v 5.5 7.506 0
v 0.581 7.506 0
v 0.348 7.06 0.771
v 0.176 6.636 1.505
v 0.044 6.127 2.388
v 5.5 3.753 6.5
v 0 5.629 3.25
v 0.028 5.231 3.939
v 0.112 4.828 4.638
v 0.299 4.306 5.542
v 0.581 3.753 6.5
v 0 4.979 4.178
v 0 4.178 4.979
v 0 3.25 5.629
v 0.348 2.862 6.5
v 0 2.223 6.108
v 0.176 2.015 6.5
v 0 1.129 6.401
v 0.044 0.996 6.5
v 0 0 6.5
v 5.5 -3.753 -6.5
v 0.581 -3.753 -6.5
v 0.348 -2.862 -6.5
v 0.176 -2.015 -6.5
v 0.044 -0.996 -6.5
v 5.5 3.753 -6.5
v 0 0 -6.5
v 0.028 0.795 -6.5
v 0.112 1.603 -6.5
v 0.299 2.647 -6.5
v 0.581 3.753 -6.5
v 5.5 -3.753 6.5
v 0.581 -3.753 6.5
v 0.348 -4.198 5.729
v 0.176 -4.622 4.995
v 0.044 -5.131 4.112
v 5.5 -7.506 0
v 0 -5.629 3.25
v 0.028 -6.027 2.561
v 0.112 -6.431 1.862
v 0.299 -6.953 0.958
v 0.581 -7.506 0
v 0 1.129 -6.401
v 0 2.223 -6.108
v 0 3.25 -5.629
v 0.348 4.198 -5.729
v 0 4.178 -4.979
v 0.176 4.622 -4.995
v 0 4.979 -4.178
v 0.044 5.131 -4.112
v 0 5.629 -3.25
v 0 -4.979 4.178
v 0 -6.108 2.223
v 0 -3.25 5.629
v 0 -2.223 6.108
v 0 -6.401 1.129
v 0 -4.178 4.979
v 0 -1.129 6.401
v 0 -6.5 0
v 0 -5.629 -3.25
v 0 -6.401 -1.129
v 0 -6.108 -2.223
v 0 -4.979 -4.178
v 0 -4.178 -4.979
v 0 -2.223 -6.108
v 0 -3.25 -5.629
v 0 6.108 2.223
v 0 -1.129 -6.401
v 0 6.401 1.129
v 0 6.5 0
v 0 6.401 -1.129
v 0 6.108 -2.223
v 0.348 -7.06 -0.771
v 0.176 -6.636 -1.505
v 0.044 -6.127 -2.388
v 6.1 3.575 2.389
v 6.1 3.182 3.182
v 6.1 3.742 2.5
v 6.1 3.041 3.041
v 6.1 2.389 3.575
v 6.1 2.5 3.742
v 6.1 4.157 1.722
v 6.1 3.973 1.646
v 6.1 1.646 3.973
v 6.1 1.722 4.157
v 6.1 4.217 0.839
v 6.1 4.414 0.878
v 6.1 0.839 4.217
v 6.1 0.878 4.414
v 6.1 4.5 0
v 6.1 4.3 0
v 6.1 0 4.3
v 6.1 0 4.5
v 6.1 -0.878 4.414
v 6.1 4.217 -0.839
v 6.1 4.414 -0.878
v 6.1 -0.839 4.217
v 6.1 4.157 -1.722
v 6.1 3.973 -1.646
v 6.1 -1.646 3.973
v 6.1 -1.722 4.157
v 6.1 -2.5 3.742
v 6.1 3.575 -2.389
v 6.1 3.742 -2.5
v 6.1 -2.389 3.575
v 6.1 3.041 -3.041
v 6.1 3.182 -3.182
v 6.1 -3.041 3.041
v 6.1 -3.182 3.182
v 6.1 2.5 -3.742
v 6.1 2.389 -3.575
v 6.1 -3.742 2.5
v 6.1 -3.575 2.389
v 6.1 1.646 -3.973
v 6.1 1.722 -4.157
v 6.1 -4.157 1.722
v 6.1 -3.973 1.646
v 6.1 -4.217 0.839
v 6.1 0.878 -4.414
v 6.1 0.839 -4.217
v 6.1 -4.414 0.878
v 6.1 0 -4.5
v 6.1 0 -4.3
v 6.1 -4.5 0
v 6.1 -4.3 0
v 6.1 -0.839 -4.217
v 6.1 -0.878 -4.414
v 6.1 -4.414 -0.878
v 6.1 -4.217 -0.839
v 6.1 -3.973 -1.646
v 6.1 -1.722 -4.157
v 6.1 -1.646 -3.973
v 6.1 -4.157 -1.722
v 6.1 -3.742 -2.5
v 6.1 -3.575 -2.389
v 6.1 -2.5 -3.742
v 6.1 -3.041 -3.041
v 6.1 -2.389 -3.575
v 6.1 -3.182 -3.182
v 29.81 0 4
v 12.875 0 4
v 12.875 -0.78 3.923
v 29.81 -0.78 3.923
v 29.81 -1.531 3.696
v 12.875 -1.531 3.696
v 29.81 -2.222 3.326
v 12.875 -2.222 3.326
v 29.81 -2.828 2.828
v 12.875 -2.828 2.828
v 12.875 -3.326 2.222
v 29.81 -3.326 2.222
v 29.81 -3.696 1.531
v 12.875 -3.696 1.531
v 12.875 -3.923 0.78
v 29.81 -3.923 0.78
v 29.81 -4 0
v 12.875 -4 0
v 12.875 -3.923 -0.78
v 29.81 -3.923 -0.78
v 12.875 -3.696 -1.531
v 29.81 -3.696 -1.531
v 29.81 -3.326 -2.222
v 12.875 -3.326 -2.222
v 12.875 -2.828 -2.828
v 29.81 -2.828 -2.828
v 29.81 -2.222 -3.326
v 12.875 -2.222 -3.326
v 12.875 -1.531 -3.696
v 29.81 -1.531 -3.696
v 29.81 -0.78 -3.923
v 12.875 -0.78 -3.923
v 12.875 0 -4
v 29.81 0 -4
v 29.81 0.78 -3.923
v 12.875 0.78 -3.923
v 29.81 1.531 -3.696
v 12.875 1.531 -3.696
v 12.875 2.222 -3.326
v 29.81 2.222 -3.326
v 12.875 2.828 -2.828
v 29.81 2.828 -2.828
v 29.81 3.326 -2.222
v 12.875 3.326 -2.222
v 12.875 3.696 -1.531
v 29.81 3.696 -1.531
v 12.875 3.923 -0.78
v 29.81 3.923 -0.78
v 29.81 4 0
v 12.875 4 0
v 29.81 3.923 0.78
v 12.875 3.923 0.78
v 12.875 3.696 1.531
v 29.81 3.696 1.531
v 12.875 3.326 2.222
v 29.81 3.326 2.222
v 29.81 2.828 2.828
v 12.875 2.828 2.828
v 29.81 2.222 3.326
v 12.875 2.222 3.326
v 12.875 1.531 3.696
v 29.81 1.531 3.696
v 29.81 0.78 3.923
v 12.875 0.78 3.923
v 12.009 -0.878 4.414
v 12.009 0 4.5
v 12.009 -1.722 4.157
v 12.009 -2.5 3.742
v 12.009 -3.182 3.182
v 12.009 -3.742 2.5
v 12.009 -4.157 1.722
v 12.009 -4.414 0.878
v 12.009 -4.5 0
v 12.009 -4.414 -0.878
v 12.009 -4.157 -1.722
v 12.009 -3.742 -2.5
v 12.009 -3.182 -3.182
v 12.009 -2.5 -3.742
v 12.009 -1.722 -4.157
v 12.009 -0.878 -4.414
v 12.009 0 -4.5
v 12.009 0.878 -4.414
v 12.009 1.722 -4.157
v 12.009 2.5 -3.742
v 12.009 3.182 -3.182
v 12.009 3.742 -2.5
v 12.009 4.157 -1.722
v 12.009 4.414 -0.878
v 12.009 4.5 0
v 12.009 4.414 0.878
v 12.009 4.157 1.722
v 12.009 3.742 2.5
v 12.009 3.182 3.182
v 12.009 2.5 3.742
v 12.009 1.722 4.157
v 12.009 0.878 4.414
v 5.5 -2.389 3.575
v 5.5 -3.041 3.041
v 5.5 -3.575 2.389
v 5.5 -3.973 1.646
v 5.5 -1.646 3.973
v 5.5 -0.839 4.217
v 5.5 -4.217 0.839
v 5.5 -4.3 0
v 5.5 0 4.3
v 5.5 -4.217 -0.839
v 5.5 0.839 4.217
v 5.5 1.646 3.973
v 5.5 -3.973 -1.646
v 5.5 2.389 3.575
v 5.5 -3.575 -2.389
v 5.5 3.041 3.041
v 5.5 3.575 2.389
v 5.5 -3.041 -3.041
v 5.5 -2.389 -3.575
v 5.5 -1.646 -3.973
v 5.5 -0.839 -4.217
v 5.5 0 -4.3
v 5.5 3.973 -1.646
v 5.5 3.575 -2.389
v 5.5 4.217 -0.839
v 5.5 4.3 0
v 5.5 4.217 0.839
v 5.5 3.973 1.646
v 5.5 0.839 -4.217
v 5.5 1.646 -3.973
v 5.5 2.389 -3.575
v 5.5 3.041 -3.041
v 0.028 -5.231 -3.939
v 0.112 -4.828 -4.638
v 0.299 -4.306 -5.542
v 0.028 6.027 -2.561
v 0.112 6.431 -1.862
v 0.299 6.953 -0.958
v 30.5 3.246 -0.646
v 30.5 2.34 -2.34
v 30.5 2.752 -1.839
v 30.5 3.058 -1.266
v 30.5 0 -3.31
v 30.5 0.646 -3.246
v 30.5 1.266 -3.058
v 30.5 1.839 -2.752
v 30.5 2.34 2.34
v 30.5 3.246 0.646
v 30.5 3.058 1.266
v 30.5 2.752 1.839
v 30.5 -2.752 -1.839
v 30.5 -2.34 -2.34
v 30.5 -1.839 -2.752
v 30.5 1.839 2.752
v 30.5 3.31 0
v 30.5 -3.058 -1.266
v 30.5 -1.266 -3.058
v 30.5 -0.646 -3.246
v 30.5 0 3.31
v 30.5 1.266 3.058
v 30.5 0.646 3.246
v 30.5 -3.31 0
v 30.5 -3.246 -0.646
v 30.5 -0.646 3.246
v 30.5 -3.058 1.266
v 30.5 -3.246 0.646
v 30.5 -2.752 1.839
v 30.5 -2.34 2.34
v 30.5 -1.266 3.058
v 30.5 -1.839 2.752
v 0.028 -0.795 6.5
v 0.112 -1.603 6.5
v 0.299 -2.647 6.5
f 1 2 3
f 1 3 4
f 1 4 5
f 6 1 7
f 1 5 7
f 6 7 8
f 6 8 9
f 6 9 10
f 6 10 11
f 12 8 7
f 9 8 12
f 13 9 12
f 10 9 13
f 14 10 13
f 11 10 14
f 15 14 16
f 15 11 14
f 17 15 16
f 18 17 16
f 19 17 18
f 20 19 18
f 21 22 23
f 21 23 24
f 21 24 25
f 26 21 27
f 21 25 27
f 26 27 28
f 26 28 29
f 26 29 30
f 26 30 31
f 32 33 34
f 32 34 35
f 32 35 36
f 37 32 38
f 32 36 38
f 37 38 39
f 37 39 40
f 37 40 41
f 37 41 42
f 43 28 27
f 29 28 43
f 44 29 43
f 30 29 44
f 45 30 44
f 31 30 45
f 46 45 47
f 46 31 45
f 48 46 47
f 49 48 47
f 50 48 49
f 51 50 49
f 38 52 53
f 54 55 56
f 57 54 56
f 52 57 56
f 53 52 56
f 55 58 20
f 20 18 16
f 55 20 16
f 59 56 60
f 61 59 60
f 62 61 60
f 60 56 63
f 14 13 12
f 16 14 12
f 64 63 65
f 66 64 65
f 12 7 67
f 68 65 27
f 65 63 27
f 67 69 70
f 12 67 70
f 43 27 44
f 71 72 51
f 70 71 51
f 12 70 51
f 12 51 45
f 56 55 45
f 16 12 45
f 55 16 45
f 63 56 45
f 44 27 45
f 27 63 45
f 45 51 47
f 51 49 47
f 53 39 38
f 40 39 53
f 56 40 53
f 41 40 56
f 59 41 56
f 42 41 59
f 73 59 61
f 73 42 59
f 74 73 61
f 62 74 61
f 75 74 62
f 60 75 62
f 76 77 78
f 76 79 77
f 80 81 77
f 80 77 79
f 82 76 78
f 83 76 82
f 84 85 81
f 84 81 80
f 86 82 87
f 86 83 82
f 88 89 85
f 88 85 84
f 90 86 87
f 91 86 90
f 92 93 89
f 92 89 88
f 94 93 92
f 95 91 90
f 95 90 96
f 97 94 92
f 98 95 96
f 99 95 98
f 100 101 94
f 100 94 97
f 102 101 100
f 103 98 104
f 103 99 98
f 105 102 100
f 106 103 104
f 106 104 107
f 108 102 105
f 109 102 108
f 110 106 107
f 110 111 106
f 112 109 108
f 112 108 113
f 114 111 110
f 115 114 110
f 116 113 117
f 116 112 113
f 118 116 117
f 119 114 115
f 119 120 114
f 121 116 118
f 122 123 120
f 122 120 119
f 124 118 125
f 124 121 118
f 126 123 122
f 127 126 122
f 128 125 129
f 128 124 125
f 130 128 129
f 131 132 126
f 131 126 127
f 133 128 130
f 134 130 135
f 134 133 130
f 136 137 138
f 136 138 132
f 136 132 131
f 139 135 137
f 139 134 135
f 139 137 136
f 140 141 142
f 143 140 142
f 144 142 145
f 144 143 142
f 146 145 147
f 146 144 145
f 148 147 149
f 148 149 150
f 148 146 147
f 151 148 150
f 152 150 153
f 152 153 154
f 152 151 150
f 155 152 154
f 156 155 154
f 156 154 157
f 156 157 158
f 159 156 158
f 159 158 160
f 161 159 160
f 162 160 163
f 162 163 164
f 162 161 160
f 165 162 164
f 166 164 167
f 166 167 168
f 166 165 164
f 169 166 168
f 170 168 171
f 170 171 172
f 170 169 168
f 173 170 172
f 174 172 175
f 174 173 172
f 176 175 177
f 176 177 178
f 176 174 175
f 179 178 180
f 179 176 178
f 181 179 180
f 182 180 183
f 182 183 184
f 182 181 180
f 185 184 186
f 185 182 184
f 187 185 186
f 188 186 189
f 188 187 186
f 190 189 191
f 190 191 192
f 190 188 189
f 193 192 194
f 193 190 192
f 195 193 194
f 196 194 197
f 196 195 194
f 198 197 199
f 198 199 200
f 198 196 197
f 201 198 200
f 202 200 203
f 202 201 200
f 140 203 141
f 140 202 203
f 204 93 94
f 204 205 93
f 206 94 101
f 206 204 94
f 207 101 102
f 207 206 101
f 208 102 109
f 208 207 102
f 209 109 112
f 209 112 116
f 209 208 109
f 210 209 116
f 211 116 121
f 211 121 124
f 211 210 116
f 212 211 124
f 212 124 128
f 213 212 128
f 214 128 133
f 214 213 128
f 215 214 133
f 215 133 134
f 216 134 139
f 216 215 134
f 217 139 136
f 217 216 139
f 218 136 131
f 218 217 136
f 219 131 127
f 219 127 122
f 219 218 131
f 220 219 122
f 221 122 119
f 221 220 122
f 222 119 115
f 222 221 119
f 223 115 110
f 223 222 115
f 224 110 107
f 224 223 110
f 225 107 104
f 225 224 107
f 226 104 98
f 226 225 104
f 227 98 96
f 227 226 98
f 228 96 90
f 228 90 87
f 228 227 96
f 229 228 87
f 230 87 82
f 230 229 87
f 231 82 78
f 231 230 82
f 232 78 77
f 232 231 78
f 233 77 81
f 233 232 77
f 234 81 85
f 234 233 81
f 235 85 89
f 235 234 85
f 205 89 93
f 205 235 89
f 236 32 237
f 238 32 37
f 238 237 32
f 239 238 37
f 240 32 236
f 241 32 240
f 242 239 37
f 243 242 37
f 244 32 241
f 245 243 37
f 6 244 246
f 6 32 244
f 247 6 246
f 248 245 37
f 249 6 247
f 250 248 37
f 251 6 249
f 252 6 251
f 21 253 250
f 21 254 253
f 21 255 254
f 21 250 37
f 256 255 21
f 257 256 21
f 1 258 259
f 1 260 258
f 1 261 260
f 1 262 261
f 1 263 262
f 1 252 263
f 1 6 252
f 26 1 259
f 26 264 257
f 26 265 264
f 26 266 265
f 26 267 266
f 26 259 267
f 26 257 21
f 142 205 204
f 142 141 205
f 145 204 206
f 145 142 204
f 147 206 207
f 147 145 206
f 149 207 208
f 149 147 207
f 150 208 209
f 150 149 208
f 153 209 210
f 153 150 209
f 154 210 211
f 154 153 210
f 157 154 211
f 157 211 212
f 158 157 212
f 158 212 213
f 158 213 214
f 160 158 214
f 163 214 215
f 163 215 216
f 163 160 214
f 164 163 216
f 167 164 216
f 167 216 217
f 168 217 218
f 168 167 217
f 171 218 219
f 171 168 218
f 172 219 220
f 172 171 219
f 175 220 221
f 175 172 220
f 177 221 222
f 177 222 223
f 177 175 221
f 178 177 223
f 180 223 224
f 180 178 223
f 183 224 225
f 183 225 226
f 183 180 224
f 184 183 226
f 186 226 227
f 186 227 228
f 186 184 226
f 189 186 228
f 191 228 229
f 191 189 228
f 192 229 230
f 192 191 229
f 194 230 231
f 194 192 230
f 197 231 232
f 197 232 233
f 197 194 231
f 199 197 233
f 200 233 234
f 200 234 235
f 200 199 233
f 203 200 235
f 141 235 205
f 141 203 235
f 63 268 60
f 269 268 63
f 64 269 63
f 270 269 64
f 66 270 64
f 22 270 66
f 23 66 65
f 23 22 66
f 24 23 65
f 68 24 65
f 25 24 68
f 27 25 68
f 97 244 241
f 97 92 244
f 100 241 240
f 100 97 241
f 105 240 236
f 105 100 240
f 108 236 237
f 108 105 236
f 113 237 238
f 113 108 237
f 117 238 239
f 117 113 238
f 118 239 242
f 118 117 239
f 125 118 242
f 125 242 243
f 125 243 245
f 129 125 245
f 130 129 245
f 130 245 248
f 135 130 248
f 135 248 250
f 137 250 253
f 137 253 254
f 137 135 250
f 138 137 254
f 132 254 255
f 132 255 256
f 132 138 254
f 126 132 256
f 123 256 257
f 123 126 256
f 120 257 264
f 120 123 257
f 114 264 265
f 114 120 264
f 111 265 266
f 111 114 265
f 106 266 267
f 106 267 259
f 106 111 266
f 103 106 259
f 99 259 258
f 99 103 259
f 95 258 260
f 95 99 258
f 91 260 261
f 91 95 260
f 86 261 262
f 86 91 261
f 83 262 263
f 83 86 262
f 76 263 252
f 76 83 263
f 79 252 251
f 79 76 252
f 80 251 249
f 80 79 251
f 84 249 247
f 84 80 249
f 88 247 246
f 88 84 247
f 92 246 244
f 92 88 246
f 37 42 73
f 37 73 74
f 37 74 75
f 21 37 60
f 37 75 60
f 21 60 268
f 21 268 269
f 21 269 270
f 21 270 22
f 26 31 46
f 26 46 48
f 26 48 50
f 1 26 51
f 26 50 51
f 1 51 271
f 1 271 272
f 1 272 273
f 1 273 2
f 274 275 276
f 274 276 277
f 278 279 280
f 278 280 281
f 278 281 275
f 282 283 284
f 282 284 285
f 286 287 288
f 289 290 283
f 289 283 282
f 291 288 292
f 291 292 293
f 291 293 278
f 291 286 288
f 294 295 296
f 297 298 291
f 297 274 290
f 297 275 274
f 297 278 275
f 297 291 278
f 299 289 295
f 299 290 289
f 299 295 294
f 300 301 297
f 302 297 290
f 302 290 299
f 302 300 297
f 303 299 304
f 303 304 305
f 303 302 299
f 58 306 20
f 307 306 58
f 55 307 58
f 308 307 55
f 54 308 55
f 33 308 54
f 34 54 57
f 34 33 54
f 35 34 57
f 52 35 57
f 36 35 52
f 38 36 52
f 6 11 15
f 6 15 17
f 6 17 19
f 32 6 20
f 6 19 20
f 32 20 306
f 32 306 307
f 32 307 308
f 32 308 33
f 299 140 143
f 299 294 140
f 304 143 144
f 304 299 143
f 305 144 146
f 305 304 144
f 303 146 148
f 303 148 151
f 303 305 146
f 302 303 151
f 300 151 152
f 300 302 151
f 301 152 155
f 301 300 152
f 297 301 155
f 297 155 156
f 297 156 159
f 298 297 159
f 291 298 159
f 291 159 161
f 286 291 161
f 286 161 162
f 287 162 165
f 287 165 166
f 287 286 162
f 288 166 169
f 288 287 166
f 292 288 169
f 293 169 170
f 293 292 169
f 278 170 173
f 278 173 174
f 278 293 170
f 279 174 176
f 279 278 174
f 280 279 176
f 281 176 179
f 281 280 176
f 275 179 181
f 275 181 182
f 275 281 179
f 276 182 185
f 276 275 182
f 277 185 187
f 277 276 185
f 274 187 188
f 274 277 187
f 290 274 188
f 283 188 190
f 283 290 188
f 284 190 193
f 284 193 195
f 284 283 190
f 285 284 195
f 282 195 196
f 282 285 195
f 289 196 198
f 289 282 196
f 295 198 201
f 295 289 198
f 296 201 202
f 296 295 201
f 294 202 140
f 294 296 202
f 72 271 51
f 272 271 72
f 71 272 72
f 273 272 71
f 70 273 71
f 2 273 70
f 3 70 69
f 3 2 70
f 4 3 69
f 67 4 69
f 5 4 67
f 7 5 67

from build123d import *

# Parameters (mm, degrees)
BASEHEAD_DEPTH = 5.5


with BuildPart() as part:
    # BaseHeadSke → BaseHead (new body)
    with BuildSketch(Plane(origin=(0, 0, 0), x_dir=(0, 0, -1), z_dir=(1, 0, 0))):
        Polygon((0, 7.505553499), (-6.5, 3.75277675), (-6.5, -3.75277675), (0, -7.505553499), (6.5, -3.75277675), (6.5, 3.75277675), align=None)
    extrude(amount=BASEHEAD_DEPTH)

    # HeadChamferSke → HeadChamfer (revolve, cut)
    with BuildSketch(Plane.XY):
        Polygon((0, 7.505553499), (0, 6.5), (0.580556584, 7.505553499), align=None)
    revolve(axis=Axis((0, 0, 0), (1, 0, 0)), mode=Mode.SUBTRACT)

    # BodySke → BaseBody (revolve)
    with BuildSketch(Plane.XY, mode=Mode.PRIVATE) as basebody_sk:
        Polygon((5.5, 4.3), (6.1, 4.3), (6.1, 4.5), (12.008974596, 4.5), (12.875, 4), (29.8095, 4), (30.5, 3.3095), (30.5, 0), (5.5, 0), align=None)
    revolve(basebody_sk.sketch.rotate(Axis((0, 0, 0), (1, 0, 0)), 90), axis=Axis((0, 0, 0), (1, 0, 0)))


solid = part.part
